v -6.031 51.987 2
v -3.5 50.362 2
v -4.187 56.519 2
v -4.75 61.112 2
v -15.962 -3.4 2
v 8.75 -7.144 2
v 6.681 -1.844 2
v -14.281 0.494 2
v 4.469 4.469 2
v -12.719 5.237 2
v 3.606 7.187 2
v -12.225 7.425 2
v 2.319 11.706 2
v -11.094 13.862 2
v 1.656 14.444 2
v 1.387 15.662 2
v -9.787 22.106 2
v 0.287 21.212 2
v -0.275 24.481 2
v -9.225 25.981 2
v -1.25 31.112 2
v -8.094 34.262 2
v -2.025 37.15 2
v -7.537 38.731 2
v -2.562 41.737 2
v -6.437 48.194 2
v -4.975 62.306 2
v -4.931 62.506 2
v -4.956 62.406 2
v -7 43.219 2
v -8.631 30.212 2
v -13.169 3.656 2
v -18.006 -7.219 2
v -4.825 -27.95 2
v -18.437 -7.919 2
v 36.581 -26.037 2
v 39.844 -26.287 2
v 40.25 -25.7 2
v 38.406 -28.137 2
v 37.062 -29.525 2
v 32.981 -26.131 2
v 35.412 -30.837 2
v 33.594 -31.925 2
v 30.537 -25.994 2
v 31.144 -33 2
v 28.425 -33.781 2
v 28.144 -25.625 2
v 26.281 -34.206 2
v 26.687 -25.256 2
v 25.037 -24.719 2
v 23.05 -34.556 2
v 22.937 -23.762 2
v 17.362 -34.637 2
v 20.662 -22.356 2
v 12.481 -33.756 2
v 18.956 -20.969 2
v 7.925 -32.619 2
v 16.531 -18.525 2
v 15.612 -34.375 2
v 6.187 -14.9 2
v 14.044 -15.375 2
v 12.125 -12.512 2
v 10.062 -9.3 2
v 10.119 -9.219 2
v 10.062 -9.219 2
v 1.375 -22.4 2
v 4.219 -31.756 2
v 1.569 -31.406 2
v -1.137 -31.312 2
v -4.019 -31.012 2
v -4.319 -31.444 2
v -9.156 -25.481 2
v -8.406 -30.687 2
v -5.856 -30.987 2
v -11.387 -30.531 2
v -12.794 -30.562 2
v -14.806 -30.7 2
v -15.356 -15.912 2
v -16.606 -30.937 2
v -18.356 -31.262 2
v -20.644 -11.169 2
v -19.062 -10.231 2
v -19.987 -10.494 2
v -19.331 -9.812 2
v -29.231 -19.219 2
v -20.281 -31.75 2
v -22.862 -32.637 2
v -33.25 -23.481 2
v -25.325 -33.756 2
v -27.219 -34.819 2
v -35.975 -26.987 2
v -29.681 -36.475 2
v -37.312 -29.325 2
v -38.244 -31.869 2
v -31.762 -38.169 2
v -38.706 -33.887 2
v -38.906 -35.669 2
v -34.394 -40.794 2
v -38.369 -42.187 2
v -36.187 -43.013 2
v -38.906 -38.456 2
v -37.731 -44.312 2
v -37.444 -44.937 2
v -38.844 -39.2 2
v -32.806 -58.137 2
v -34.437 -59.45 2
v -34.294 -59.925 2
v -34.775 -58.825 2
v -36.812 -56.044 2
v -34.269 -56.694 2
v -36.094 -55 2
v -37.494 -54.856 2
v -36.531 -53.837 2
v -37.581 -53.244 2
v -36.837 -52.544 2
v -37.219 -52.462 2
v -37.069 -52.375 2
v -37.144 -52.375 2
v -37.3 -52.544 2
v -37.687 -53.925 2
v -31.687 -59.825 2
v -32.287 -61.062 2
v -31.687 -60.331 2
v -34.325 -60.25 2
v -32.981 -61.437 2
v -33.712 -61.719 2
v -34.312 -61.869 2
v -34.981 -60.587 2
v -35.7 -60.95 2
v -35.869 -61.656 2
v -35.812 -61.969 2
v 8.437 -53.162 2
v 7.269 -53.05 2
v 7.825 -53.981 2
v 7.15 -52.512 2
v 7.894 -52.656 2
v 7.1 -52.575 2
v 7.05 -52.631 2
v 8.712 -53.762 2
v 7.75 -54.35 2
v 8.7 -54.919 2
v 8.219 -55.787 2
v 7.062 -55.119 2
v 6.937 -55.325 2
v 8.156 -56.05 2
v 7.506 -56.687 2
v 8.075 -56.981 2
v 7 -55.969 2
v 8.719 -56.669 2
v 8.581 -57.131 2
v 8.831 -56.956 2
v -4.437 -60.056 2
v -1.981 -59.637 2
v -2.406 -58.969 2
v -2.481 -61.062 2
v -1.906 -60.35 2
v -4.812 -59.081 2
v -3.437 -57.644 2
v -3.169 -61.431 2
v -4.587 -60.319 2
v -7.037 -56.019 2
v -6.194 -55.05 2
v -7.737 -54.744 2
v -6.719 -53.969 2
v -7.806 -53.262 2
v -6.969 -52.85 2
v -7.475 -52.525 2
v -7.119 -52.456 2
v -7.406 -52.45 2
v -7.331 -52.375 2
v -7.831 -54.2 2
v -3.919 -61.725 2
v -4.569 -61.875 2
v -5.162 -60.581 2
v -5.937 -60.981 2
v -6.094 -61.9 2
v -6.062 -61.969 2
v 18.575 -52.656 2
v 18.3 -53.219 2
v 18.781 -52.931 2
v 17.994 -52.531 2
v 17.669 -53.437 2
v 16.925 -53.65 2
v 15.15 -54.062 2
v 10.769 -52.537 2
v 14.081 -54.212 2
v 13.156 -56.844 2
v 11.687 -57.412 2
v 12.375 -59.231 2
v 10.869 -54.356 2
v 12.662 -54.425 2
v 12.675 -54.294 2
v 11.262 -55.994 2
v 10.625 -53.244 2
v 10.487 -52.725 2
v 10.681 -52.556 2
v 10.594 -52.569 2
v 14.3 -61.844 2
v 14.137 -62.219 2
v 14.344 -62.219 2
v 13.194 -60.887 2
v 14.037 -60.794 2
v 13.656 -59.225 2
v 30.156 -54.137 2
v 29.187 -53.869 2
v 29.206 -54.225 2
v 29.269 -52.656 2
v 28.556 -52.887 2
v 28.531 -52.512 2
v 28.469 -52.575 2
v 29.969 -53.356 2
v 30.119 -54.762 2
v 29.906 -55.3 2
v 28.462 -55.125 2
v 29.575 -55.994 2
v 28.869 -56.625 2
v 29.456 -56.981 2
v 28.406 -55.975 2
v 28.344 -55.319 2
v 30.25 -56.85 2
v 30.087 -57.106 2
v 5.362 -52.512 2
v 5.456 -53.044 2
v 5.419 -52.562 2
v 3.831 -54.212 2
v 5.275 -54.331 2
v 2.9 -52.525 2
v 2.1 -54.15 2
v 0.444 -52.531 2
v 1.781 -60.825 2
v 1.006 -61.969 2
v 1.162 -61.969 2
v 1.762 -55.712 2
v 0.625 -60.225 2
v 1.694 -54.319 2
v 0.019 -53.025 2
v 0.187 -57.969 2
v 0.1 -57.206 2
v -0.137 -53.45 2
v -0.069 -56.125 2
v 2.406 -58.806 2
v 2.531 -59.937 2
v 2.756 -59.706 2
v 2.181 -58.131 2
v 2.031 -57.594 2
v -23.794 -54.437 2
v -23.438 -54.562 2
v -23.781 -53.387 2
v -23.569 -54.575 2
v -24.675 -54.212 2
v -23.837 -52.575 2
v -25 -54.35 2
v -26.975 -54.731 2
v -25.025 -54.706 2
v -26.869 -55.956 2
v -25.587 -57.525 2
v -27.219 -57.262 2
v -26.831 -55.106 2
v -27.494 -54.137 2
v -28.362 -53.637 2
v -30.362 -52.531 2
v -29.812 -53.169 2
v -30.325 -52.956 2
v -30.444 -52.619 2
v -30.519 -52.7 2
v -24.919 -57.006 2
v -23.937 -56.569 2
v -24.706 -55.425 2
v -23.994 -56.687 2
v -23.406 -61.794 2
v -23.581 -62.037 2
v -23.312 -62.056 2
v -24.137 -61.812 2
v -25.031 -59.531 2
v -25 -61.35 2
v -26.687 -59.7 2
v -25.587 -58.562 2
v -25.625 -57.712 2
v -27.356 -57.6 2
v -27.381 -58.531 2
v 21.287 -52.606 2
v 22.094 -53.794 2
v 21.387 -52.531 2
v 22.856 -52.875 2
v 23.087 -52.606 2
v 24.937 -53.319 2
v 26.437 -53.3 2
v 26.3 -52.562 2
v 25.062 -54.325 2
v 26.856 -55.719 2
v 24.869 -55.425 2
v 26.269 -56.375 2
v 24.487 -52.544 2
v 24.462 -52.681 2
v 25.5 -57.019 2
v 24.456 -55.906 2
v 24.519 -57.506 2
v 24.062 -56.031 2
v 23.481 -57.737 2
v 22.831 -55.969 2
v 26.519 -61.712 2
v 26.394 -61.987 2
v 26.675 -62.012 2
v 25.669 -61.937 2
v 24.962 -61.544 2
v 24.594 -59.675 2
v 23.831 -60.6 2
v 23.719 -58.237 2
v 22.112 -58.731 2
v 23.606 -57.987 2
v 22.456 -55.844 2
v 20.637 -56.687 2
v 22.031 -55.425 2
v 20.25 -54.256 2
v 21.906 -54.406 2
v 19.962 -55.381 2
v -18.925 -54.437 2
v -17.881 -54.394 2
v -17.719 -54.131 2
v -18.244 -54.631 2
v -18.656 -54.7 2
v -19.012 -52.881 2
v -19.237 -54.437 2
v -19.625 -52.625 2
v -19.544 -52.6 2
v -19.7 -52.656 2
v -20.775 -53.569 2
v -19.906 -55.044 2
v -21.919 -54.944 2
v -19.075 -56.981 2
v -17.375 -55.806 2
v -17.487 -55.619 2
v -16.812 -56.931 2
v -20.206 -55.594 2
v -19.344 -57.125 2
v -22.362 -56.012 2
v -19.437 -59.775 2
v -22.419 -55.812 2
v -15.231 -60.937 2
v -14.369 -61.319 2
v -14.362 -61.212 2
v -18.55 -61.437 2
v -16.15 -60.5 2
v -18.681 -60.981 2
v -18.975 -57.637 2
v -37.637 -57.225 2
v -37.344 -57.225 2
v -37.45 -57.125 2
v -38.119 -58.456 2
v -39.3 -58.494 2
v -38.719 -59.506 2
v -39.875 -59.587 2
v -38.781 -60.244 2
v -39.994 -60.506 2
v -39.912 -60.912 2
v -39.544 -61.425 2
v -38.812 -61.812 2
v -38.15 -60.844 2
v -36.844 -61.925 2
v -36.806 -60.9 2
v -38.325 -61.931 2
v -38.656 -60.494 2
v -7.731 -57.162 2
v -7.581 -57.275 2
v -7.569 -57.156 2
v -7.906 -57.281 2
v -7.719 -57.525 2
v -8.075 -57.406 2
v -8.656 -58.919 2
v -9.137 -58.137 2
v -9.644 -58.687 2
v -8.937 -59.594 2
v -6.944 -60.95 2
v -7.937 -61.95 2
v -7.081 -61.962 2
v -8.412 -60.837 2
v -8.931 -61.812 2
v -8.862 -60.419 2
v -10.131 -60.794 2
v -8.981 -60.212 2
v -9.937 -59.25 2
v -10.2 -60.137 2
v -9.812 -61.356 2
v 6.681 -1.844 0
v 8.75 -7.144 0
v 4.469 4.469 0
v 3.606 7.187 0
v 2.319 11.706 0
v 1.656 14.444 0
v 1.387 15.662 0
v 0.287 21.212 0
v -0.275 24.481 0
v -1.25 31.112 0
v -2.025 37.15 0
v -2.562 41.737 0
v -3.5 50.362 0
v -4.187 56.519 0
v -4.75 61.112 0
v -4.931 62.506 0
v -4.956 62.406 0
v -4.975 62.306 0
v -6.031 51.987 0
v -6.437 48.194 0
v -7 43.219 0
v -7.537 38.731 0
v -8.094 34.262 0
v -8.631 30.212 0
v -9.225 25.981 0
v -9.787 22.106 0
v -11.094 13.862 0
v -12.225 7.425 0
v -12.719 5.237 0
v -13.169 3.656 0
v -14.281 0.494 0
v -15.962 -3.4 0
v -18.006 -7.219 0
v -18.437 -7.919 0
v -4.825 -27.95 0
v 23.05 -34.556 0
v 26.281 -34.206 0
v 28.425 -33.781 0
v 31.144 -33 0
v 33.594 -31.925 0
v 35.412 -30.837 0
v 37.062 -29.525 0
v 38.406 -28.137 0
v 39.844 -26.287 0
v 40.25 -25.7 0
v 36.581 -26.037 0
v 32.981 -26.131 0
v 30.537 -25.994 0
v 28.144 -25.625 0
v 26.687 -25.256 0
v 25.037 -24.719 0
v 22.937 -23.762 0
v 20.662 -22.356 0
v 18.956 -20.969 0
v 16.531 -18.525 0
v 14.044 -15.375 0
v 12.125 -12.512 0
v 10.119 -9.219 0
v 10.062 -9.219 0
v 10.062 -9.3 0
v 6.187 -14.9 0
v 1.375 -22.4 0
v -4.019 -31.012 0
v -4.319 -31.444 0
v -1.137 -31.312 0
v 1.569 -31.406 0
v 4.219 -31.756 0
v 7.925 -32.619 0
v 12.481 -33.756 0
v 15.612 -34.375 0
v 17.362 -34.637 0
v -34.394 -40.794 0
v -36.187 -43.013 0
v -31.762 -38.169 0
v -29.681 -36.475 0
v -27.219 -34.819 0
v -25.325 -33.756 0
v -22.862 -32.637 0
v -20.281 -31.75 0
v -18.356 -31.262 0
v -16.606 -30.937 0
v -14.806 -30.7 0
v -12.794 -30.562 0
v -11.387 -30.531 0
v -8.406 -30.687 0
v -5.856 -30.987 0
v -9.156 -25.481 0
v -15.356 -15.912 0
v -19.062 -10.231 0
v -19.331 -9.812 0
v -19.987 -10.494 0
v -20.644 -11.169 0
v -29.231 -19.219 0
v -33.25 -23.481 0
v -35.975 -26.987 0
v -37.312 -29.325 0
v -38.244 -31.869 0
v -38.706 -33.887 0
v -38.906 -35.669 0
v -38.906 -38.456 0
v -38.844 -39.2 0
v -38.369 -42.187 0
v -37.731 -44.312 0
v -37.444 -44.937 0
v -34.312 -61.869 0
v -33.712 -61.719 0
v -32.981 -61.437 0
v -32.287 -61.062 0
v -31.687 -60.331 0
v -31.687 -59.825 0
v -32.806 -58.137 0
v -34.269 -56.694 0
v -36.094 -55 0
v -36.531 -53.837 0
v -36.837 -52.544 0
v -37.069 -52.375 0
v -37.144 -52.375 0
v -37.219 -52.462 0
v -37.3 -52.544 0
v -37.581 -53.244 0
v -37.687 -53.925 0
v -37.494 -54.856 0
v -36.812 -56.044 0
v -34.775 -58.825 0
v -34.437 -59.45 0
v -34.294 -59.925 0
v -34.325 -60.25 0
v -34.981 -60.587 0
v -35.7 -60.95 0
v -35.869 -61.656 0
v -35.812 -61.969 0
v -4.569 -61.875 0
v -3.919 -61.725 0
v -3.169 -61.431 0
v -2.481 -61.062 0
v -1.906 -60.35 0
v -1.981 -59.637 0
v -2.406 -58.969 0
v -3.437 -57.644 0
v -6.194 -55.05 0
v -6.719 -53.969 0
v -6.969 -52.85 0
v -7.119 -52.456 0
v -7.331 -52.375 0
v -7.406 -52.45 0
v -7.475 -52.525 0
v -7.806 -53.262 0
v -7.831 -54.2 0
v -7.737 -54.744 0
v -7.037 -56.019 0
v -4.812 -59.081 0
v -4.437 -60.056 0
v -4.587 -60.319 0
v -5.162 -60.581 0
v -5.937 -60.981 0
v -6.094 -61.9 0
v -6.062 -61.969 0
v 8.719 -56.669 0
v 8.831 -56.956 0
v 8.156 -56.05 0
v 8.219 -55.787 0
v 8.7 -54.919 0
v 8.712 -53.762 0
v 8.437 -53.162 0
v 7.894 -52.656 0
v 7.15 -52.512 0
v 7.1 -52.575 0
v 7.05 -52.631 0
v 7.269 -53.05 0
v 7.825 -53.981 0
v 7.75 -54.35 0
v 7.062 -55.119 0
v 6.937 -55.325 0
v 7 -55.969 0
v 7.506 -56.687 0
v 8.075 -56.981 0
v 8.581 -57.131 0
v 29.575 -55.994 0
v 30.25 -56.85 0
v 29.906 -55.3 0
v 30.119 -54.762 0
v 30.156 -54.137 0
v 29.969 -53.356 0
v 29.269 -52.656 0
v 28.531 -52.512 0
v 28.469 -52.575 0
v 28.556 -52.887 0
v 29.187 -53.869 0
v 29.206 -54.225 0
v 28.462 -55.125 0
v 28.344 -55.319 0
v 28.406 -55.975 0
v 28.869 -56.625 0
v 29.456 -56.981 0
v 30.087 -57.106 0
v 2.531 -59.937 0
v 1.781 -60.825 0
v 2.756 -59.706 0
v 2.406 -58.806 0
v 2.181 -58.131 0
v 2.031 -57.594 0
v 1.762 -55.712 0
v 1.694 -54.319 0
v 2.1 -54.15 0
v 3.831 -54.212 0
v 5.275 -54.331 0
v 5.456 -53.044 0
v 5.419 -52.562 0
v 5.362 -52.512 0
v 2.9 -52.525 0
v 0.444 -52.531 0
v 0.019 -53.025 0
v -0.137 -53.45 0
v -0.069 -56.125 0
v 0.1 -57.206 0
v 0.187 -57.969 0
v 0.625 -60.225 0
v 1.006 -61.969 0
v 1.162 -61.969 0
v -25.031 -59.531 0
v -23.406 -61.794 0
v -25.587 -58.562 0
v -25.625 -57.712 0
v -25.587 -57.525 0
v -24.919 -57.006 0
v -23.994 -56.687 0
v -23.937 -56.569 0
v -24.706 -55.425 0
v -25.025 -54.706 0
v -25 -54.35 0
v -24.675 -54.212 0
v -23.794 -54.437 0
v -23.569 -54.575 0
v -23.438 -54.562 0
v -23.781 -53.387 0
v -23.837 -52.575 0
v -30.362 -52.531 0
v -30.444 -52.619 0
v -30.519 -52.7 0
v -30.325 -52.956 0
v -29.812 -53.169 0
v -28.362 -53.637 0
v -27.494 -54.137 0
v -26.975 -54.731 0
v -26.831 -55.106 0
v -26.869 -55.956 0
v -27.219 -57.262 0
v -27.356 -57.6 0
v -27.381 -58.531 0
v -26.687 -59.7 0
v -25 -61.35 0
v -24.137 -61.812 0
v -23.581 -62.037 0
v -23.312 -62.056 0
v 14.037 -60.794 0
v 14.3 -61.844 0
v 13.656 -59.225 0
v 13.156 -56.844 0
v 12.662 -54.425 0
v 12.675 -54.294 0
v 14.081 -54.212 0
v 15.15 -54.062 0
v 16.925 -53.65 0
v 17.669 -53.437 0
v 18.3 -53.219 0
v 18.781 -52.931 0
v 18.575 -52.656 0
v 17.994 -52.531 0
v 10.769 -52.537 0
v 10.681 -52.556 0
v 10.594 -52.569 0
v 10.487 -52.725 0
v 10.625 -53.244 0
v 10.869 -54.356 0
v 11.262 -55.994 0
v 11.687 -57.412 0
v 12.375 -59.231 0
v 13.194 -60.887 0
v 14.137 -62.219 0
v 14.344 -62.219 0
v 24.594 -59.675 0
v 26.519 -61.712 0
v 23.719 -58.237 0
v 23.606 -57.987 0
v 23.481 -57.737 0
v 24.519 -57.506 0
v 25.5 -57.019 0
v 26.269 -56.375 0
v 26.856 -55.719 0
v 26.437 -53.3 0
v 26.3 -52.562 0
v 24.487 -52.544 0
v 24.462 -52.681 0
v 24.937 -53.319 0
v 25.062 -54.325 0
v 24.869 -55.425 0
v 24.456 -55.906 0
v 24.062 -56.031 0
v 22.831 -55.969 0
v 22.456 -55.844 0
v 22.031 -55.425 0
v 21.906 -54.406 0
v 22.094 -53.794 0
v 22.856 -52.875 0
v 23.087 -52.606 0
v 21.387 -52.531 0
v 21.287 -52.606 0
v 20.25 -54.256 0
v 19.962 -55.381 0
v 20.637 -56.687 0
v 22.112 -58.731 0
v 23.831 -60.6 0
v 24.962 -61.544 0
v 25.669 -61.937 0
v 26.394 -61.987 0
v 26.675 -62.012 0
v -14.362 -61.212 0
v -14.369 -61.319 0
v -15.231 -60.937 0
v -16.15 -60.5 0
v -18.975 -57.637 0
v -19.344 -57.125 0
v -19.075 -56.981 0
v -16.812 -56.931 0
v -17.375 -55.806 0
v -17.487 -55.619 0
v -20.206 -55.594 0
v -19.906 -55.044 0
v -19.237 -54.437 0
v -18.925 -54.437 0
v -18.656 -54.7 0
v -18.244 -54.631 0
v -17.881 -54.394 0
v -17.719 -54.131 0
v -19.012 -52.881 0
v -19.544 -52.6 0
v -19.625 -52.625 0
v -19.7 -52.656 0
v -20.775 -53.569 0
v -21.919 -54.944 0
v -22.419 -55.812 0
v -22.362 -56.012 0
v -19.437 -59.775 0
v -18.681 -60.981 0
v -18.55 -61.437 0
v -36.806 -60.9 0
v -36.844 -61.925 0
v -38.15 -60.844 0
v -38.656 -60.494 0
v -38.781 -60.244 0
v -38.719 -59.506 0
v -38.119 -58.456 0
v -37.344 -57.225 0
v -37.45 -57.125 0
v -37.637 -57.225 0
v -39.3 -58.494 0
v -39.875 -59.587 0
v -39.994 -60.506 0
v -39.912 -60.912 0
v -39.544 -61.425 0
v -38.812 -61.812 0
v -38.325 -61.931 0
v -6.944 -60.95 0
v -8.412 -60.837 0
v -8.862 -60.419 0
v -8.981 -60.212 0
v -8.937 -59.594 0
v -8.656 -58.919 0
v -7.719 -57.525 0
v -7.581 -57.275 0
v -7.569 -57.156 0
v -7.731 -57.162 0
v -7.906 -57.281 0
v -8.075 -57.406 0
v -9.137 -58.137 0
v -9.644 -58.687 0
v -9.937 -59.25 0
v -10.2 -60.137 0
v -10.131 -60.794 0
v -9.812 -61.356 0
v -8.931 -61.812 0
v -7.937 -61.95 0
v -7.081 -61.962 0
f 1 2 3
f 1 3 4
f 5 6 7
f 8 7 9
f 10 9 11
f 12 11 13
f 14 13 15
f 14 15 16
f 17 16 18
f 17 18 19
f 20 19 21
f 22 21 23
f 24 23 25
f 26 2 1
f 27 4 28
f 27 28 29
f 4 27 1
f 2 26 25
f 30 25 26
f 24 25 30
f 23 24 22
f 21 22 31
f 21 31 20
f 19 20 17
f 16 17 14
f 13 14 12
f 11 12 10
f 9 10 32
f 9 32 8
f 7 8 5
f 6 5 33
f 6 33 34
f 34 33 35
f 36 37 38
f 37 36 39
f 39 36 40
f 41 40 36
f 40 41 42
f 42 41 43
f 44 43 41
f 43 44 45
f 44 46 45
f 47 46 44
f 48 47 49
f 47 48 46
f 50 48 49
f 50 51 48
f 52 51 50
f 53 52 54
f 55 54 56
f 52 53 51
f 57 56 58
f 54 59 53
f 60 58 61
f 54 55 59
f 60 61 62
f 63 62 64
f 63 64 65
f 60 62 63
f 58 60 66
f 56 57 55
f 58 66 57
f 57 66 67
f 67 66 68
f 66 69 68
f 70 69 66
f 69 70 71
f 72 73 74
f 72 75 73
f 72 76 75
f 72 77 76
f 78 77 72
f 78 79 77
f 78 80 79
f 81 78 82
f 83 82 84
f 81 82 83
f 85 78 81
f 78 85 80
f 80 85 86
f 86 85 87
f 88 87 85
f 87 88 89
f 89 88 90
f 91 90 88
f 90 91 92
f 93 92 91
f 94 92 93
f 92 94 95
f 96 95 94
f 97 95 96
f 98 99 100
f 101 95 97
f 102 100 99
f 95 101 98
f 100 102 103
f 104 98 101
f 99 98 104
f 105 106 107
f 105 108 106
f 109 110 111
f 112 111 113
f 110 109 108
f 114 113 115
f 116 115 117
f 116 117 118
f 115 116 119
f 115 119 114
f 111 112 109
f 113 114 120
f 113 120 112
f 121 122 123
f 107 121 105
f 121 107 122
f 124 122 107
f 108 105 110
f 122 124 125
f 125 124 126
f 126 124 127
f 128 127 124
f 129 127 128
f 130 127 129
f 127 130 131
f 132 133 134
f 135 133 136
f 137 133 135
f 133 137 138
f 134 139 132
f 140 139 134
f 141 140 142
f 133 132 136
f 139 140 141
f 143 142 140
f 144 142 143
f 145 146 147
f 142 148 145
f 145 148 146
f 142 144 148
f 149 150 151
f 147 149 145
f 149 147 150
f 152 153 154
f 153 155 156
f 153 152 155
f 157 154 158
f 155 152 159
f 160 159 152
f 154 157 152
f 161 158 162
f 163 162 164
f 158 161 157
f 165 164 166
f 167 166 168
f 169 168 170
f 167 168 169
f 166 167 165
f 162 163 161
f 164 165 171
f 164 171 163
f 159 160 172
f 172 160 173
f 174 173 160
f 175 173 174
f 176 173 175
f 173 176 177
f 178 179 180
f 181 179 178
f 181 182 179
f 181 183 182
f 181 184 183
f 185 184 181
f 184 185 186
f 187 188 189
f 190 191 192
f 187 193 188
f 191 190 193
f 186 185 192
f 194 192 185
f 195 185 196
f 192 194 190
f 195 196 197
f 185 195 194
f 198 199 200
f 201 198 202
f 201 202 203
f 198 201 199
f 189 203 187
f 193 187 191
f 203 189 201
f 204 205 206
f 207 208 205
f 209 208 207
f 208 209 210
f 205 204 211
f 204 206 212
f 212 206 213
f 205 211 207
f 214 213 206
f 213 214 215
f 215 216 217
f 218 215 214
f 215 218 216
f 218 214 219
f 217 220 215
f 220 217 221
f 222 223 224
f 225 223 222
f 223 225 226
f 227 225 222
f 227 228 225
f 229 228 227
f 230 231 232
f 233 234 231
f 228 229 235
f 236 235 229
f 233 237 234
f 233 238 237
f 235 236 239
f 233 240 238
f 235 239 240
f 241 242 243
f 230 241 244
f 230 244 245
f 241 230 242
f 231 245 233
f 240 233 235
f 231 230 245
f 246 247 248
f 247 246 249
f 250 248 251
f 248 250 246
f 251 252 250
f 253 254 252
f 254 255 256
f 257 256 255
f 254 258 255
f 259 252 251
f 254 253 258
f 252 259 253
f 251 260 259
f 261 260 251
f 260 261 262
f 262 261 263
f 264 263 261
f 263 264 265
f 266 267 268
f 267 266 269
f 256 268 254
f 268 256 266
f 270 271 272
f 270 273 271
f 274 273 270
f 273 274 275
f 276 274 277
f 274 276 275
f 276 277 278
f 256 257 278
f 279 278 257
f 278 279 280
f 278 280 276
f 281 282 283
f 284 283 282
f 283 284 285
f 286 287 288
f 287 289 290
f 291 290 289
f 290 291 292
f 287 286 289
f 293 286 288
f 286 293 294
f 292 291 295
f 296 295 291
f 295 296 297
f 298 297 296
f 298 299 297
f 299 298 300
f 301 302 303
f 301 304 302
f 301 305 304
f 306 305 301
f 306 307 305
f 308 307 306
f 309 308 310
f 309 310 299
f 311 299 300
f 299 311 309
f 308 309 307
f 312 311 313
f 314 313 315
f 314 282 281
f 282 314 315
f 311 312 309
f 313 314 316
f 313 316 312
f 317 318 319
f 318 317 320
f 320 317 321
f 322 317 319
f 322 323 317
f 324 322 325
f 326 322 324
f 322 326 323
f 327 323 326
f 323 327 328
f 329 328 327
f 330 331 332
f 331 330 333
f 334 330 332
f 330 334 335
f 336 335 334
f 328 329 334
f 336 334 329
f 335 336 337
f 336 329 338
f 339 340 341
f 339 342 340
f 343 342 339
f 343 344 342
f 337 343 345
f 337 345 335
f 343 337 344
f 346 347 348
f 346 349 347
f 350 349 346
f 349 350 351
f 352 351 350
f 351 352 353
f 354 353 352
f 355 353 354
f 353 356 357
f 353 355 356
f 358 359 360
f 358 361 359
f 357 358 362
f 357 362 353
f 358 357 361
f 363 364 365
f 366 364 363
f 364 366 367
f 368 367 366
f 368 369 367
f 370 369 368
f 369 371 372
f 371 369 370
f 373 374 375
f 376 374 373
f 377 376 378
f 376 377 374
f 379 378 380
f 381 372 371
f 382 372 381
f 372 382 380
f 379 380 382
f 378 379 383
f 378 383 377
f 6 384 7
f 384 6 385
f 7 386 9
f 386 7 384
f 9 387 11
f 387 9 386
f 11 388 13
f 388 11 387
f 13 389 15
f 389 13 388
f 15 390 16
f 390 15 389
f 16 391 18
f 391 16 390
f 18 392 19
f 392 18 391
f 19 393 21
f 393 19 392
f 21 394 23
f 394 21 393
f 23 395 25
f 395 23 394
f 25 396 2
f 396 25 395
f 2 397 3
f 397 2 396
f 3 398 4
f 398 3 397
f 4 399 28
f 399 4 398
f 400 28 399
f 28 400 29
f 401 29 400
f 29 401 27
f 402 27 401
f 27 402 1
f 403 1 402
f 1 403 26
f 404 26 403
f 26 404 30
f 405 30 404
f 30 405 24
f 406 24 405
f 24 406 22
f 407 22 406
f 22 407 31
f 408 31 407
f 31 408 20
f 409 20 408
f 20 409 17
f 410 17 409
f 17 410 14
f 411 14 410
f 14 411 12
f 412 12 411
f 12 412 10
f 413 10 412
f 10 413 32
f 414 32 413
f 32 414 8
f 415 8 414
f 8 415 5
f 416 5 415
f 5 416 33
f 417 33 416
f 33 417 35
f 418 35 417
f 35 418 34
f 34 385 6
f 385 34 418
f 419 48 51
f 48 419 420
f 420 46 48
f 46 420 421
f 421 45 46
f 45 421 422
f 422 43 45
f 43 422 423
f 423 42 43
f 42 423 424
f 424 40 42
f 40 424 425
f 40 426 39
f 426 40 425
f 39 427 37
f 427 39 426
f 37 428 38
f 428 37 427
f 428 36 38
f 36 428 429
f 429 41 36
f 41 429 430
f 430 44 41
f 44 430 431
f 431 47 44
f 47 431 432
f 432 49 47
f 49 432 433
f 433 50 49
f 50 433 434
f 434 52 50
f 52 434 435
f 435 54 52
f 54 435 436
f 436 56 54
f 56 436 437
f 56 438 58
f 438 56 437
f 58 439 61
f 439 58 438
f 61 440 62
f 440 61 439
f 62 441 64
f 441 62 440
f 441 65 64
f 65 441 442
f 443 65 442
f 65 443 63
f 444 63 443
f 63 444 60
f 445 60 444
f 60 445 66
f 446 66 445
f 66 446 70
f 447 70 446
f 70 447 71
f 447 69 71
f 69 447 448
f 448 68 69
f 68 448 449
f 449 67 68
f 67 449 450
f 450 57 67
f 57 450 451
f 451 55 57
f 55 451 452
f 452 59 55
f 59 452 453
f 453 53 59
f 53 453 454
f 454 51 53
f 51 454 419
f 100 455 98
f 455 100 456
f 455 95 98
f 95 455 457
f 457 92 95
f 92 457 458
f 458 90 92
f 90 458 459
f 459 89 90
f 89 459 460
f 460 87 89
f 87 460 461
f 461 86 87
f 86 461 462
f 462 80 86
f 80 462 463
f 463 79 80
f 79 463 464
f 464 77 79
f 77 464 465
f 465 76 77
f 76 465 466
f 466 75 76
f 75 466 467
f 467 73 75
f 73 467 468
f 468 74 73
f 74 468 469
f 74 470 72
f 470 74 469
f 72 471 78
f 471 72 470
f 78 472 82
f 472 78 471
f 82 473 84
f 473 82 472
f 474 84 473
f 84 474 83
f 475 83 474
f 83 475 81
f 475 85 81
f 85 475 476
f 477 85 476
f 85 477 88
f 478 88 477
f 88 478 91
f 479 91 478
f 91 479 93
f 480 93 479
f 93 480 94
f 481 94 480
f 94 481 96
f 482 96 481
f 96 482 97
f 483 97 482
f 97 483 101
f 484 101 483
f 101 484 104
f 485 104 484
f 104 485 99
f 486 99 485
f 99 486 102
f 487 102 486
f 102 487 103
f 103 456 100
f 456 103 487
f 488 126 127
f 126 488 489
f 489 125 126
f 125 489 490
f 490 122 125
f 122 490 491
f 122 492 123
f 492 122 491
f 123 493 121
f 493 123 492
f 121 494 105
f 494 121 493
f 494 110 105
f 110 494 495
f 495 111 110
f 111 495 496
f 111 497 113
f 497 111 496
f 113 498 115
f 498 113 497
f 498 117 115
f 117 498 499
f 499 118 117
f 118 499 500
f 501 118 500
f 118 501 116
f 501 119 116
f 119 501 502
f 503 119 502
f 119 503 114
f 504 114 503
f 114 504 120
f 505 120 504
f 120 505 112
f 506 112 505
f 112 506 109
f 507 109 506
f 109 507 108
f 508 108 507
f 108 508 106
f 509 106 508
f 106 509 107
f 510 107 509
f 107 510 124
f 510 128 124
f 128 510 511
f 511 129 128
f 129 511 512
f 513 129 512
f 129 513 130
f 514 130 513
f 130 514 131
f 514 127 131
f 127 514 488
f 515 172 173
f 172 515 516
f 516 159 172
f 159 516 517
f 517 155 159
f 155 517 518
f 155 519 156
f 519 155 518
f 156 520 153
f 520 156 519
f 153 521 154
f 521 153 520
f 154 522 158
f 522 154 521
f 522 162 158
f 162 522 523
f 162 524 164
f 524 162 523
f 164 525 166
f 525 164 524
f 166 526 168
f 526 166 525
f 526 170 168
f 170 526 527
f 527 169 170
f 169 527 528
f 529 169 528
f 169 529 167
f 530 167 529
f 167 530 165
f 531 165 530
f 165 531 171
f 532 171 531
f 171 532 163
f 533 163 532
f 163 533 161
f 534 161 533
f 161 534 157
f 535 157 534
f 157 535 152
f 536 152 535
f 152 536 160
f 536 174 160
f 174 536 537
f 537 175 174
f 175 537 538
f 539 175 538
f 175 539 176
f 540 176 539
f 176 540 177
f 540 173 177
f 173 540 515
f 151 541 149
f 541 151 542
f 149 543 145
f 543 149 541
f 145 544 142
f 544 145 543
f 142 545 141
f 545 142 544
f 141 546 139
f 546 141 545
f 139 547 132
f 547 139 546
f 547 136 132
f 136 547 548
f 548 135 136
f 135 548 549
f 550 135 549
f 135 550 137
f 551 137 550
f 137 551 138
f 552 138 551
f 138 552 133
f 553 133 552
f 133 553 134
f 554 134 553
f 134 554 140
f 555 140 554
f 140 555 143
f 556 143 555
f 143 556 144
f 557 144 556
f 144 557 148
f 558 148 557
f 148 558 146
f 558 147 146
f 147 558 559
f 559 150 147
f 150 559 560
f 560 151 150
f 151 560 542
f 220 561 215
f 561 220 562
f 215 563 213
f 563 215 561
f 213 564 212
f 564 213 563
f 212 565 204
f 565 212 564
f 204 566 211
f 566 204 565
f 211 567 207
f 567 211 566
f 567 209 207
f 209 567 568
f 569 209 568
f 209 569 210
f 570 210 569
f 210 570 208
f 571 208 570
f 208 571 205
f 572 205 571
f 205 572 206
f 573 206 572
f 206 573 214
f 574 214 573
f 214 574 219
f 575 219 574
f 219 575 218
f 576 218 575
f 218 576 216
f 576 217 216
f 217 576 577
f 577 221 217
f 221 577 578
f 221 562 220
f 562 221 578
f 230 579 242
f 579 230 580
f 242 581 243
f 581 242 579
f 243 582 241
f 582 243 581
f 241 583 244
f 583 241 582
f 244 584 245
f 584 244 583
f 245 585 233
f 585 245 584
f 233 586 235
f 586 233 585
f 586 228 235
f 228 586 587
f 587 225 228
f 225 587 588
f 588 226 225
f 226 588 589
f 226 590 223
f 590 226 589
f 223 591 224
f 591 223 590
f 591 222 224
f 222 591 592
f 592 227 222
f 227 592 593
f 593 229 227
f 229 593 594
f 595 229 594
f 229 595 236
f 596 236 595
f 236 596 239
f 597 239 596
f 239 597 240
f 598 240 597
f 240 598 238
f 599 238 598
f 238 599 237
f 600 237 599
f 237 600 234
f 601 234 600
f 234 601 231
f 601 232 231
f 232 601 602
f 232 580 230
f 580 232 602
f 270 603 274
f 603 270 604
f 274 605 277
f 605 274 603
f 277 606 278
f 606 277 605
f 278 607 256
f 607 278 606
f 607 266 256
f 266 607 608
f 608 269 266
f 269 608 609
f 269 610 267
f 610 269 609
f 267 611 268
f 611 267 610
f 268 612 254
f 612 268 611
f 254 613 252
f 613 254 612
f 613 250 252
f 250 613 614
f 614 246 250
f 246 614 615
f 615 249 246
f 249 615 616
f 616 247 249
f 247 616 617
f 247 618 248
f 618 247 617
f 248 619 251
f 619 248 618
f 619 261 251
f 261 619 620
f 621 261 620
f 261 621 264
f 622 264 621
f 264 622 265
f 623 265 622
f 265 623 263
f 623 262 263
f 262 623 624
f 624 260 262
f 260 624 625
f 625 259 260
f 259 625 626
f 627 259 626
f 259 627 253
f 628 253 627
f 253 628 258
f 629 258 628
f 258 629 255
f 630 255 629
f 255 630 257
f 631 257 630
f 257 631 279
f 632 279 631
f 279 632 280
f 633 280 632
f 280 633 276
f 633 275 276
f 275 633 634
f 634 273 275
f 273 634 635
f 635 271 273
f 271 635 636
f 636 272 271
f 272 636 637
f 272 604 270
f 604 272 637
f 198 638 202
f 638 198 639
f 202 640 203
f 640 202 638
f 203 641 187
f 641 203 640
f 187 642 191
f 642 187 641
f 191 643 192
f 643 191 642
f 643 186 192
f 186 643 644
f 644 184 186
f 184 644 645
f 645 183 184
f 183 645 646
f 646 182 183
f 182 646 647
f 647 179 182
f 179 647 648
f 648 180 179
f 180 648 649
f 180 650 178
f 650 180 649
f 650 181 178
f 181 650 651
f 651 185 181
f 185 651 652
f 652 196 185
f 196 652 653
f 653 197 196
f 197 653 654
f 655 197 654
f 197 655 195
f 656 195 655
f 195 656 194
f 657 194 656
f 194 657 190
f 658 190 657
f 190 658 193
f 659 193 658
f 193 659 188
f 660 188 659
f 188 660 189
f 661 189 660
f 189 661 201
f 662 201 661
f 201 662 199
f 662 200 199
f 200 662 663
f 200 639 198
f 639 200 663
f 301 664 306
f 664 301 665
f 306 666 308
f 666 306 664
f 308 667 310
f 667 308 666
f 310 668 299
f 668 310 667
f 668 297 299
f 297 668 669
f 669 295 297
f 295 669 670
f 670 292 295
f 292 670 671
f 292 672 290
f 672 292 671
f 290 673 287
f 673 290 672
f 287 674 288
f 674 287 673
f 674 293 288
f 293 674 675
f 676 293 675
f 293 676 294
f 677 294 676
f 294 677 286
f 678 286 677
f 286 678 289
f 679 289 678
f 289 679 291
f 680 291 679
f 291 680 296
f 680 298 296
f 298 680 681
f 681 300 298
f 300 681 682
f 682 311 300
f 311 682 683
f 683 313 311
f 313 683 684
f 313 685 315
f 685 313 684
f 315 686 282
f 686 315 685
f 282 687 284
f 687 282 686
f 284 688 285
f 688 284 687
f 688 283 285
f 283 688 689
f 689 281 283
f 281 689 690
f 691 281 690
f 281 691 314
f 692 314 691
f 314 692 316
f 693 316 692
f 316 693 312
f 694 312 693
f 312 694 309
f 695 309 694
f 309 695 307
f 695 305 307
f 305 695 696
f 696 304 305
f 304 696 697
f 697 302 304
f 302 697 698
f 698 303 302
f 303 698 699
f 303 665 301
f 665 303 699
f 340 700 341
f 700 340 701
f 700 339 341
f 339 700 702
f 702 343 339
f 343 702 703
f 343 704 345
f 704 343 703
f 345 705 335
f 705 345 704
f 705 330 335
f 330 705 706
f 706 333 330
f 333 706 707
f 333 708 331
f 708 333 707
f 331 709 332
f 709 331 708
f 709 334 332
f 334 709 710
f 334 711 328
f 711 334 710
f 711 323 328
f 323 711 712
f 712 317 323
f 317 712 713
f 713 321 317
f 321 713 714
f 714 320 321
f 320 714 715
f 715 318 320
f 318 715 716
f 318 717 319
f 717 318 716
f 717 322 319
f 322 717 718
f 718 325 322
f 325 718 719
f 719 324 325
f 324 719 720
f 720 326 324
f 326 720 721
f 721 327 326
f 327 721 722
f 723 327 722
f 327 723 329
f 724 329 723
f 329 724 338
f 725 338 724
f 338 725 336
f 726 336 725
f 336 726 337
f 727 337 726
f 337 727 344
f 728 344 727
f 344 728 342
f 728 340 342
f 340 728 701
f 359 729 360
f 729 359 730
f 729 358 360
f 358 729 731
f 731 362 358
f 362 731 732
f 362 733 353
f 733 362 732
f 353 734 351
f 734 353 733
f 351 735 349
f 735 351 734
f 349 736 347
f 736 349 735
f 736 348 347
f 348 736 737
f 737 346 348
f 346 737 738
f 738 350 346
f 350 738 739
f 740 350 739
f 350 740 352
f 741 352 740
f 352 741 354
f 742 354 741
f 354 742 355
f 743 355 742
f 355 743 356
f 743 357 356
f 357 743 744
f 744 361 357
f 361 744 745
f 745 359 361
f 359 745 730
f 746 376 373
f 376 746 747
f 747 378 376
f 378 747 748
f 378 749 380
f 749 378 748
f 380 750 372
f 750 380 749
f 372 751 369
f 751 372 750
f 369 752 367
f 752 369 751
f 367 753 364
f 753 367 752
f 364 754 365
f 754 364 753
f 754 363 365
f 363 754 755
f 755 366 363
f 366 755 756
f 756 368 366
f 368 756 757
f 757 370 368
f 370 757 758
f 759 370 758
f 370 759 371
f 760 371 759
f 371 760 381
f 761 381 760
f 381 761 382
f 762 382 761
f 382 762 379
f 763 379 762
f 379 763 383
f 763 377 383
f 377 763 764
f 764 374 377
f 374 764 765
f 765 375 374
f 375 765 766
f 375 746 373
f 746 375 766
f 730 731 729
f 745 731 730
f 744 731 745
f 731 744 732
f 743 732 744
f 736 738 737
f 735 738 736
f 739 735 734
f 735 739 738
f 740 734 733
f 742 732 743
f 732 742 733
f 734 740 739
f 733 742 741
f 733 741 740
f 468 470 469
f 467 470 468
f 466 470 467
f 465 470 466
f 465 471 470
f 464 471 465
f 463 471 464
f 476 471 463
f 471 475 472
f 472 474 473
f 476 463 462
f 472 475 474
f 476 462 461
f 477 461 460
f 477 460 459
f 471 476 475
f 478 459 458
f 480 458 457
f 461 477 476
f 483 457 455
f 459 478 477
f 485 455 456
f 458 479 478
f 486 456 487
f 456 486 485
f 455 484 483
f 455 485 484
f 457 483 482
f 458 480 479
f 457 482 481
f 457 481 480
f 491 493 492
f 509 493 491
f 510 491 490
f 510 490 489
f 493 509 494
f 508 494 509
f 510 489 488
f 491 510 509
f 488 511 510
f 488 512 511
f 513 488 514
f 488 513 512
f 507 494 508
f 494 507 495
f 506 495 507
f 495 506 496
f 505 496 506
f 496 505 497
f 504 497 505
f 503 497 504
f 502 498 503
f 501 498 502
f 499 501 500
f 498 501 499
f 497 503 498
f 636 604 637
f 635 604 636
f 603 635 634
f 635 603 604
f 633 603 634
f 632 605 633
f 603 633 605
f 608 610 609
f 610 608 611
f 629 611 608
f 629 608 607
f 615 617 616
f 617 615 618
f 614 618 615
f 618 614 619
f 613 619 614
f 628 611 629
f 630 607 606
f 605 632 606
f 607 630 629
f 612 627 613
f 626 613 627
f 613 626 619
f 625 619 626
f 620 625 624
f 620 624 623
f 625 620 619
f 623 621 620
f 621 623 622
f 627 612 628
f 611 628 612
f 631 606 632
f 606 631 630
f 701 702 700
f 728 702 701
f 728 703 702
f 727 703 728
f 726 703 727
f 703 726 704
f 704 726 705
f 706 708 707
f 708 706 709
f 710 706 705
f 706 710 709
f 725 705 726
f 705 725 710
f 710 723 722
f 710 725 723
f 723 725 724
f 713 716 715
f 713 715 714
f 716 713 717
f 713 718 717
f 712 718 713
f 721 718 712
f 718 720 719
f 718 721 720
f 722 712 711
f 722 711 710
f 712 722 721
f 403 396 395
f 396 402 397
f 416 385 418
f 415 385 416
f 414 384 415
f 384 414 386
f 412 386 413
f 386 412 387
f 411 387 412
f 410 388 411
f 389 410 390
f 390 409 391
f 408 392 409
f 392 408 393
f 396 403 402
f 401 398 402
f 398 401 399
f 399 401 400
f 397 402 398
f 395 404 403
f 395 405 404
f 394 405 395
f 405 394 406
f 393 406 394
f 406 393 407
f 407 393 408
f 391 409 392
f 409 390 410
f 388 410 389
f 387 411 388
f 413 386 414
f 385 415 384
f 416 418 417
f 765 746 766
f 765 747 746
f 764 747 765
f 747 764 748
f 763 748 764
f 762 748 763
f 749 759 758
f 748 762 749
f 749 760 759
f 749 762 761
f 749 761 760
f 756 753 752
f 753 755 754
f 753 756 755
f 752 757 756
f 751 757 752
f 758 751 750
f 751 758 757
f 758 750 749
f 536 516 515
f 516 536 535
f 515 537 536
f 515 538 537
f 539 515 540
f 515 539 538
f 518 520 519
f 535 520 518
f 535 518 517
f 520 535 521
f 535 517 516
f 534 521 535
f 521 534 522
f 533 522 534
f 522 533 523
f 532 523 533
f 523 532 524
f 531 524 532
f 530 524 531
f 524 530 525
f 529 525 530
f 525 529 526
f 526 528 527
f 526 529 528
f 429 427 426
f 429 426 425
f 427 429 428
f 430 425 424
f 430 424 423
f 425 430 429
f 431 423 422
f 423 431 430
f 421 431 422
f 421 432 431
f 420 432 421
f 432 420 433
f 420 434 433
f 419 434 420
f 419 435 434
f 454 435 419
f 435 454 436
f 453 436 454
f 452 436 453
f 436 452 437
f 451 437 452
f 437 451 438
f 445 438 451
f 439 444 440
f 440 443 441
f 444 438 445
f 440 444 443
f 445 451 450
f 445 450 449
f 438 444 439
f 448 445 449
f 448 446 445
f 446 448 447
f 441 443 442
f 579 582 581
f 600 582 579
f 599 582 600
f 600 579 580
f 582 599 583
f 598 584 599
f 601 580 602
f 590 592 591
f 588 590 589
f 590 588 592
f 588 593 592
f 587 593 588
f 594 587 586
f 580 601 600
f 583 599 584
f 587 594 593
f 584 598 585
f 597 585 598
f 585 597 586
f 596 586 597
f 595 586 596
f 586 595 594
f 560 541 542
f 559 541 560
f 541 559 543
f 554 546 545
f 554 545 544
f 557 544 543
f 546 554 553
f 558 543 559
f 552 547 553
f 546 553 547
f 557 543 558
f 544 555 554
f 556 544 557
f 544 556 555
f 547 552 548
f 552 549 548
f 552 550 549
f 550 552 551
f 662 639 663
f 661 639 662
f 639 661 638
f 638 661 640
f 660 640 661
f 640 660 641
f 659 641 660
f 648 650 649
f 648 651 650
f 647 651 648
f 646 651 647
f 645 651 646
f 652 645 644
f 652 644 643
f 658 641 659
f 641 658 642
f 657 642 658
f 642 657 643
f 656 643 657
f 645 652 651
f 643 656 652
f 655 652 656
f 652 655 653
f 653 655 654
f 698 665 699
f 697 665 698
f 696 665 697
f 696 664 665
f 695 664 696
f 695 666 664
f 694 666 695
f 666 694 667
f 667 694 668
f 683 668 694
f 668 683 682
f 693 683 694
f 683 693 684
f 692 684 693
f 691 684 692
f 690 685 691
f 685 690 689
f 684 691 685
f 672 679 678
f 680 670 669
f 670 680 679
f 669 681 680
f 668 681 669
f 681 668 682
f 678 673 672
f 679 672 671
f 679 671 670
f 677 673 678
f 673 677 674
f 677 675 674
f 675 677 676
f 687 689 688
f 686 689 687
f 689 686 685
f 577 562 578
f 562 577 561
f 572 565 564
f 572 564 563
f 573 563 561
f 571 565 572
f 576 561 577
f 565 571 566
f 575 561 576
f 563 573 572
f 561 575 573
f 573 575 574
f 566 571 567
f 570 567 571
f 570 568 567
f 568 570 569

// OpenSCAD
module e957dc8aa46a37195b78d457369b3665_1()
{
 /* Generated by trace2scad version 20150415
    http://aggregate.org/MAKE/TRACE2SCAD/
    Optimized model has 387/4796 original points
 */
 color([0.48, 0.48, 0.48])
 assign(minx=0) /* polygon minx=39 */
 assign(miny=0) /* polygon miny=45 */
 assign(maxx=12880) /* polygon maxx=12880 */
 assign(maxy=20000) /* polygon maxy=20001 */
 assign(dx=maxx-minx)
 assign(dy=maxy-miny)
 assign(maxd=((dx>dy)?dx:dy))
 scale([1/maxd, 1/maxd, 1])
 translate([-minx-dx/2, -miny-dy/2, 0])
 linear_extrude(height=1, convexity=387)
 union() {
  union() {
   polygon([[5647,19985],[5644,19969],[5475,18318],[5410,17711],[5320,16915],[5234,16197],[5145,15482],[5059,14834],[4964,14157],[4874,13537],[4665,12218],[4484,11188],[4405,10838],[4333,10585],[4155,10079],[3886,9456],[3559,8845],[3490,8733],[5668,5528],[7840,8857],[7509,9705],[7155,10715],[7017,11150],[6811,11873],[6705,12311],[6662,12506],[6486,13394],[6396,13917],[6240,14978],[6116,15944],[6030,16678],[5880,18058],[5770,19043],[5680,19778],[5651,20001]], convexity=6);
   polygon([[8050,8518],[8050,8512],[7430,7616],[6660,6416],[5797,5038],[5749,4969],[6258,4990],[6691,4975],[7115,4919],[7708,4781],[8437,4599],[8938,4500],[9218,4458],[10128,4471],[10645,4527],[10988,4595],[11423,4720],[11815,4892],[12106,5066],[12370,5276],[12585,5498],[12815,5794],[12880,5888],[12293,5834],[11717,5819],[11326,5841],[10943,5900],[10710,5959],[10446,6045],[10110,6198],[9746,6423],[9473,6645],[9085,7036],[8687,7540],[8380,7998],[8059,8525],[8050,8525]], convexity=9);
   polygon([[3242,8321],[3137,8213],[1763,6925],[1120,6243],[684,5682],[470,5308],[321,4901],[247,4578],[215,4293],[215,3847],[225,3728],[301,3250],[403,2910],[449,2810],[650,3118],[937,3473],[1358,3893],[1691,4164],[2085,4429],[2388,4599],[2782,4778],[3195,4920],[3503,4998],[3783,5050],[4071,5088],[4393,5110],[4618,5115],[5095,5090],[5503,5042],[4975,5923],[3983,7454],[3390,8363],[3347,8430]], convexity=7);
   polygon([[485,1606],[472,1593],[427,1481],[410,1372],[441,1223],[550,1033],[876,588],[930,488],[953,412],[948,360],[843,306],[728,248],[701,135],[710,85],[950,101],[1046,125],[1163,170],[1274,230],[1370,347],[1370,428],[1191,698],[957,929],[665,1200],[595,1386],[546,1593],[509,1620],[497,1620]], convexity=8);
   polygon([[5255,1608],[5244,1596],[5191,1478],[5187,1328],[5202,1241],[5314,1037],[5670,547],[5730,391],[5706,349],[5614,307],[5490,243],[5465,96],[5470,85],[5709,100],[5813,124],[5933,171],[6043,230],[6135,344],[6123,458],[6055,565],[5890,777],[5449,1192],[5365,1365],[5325,1544],[5301,1607],[5267,1620]], convexity=8);
   polygon([[6904,1596],[6511,1595],[6443,1516],[6418,1448],[6429,1020],[6456,847],[6470,725],[6540,364],[6601,85],[6626,85],[6725,268],[6845,410],[6881,447],[6825,591],[6789,699],[6765,785],[6722,1086],[6711,1309],[6776,1336],[7053,1326],[7284,1307],[7313,1513],[7307,1590],[7298,1598]], convexity=10);
   polygon([[7576,1588],[7568,1579],[7603,1512],[7692,1363],[7680,1304],[7570,1181],[7550,1148],[7560,1045],[7641,930],[7732,883],[7813,859],[7853,887],[7835,933],[7745,1032],[7755,1074],[7832,1213],[7834,1398],[7790,1494],[7703,1575],[7584,1598]], convexity=10);
   polygon([[11000,1593],[10995,1588],[11009,1538],[11110,1381],[11113,1324],[10994,1180],[10975,1149],[10985,1044],[11059,940],[11153,883],[11254,863],[11280,904],[11172,1041],[11225,1152],[11259,1238],[11265,1338],[11235,1463],[11123,1575],[11005,1598]], convexity=10);
   polygon([[1569,1581],[1557,1568],[1588,1527],[1670,1493],[1902,1418],[2041,1338],[2124,1243],[2147,1183],[2141,1047],[2085,838],[2063,784],[2059,635],[2170,448],[2440,184],[2578,110],[2667,74],[2710,71],[2695,113],[2435,475],[2346,630],[2340,766],[2346,796],[2453,879],[2601,930],[2610,949],[2487,1132],[2436,1247],[2440,1304],[2492,1326],[2633,1290],[2669,1268],[2690,1270],[2635,1458],[2626,1588],[1582,1595]], convexity=13);
   polygon([[8149,1591],[8135,1589],[8118,1564],[8140,1481],[8179,1303],[8242,1041],[8310,814],[8420,523],[8551,258],[8702,45],[8735,45],[8728,105],[8686,273],[8625,524],[8545,905],[8466,1292],[8468,1313],[8693,1326],[8864,1350],[9148,1416],[9267,1450],[9368,1485],[9445,1531],[9412,1575],[9319,1595],[8163,1594]], convexity=9);
   polygon([[9854,1589],[9846,1583],[9680,1319],[9634,1139],[9742,930],[9978,603],[10253,304],[10434,153],[10547,90],[10663,82],[10708,78],[10683,126],[10375,452],[10235,682],[10217,722],[10197,762],[10363,799],[10520,877],[10643,980],[10737,1085],[10670,1472],[10648,1590],[10358,1593],[10354,1571],[10430,1469],[10450,1308],[10419,1132],[10353,1055],[10290,1035],[10093,1045],[10033,1065],[9965,1132],[9945,1295],[9975,1393],[10097,1540],[10134,1583],[9862,1595]], convexity=13);
   polygon([[3300,1580],[3288,1575],[3116,1429],[2933,1209],[2853,1070],[2862,1038],[3330,436],[3451,243],[3472,170],[4141,189],[4142,206],[4003,250],[3856,320],[3404,778],[3345,860],[3388,883],[3750,891],[3660,1071],[3642,1101],[3207,1105],[3255,1193],[3362,1290],[3412,1290],[3455,1248],[3521,1259],[3579,1297],[3605,1339],[3398,1539],[3313,1584]], convexity=12);
   polygon([[433,852],[418,844],[152,641],[60,466],[41,319],[54,254],[113,172],[230,110],[308,91],[545,92],[551,256],[336,265],[255,321],[235,361],[245,479],[341,647],[465,844],[448,860]], convexity=8);
   polygon([[5175,835],[5148,815],[4978,698],[4897,610],[4850,520],[4808,378],[4819,273],[4870,183],[5011,110],[5170,88],[5307,86],[5329,248],[5094,266],[5022,333],[5003,366],[5010,465],[5055,573],[5205,796],[5227,836],[5229,855],[5203,854]], convexity=8);
  }
 }
}

module e957dc8aa46a37195b78d457369b3665()
{
 /* all layers combined, scaled to within a 1mm cube */
 scale([1, 1, 1/1])
 difference() {
  union() {
   scale([1,1,2]) translate([0,0,-0.5]) e957dc8aa46a37195b78d457369b3665_1();
  }
  translate([0,0,-2]) cube([2,2,4],center=true);
 }
}

scale([125, 125, 2]) {
	e957dc8aa46a37195b78d457369b3665();
}
